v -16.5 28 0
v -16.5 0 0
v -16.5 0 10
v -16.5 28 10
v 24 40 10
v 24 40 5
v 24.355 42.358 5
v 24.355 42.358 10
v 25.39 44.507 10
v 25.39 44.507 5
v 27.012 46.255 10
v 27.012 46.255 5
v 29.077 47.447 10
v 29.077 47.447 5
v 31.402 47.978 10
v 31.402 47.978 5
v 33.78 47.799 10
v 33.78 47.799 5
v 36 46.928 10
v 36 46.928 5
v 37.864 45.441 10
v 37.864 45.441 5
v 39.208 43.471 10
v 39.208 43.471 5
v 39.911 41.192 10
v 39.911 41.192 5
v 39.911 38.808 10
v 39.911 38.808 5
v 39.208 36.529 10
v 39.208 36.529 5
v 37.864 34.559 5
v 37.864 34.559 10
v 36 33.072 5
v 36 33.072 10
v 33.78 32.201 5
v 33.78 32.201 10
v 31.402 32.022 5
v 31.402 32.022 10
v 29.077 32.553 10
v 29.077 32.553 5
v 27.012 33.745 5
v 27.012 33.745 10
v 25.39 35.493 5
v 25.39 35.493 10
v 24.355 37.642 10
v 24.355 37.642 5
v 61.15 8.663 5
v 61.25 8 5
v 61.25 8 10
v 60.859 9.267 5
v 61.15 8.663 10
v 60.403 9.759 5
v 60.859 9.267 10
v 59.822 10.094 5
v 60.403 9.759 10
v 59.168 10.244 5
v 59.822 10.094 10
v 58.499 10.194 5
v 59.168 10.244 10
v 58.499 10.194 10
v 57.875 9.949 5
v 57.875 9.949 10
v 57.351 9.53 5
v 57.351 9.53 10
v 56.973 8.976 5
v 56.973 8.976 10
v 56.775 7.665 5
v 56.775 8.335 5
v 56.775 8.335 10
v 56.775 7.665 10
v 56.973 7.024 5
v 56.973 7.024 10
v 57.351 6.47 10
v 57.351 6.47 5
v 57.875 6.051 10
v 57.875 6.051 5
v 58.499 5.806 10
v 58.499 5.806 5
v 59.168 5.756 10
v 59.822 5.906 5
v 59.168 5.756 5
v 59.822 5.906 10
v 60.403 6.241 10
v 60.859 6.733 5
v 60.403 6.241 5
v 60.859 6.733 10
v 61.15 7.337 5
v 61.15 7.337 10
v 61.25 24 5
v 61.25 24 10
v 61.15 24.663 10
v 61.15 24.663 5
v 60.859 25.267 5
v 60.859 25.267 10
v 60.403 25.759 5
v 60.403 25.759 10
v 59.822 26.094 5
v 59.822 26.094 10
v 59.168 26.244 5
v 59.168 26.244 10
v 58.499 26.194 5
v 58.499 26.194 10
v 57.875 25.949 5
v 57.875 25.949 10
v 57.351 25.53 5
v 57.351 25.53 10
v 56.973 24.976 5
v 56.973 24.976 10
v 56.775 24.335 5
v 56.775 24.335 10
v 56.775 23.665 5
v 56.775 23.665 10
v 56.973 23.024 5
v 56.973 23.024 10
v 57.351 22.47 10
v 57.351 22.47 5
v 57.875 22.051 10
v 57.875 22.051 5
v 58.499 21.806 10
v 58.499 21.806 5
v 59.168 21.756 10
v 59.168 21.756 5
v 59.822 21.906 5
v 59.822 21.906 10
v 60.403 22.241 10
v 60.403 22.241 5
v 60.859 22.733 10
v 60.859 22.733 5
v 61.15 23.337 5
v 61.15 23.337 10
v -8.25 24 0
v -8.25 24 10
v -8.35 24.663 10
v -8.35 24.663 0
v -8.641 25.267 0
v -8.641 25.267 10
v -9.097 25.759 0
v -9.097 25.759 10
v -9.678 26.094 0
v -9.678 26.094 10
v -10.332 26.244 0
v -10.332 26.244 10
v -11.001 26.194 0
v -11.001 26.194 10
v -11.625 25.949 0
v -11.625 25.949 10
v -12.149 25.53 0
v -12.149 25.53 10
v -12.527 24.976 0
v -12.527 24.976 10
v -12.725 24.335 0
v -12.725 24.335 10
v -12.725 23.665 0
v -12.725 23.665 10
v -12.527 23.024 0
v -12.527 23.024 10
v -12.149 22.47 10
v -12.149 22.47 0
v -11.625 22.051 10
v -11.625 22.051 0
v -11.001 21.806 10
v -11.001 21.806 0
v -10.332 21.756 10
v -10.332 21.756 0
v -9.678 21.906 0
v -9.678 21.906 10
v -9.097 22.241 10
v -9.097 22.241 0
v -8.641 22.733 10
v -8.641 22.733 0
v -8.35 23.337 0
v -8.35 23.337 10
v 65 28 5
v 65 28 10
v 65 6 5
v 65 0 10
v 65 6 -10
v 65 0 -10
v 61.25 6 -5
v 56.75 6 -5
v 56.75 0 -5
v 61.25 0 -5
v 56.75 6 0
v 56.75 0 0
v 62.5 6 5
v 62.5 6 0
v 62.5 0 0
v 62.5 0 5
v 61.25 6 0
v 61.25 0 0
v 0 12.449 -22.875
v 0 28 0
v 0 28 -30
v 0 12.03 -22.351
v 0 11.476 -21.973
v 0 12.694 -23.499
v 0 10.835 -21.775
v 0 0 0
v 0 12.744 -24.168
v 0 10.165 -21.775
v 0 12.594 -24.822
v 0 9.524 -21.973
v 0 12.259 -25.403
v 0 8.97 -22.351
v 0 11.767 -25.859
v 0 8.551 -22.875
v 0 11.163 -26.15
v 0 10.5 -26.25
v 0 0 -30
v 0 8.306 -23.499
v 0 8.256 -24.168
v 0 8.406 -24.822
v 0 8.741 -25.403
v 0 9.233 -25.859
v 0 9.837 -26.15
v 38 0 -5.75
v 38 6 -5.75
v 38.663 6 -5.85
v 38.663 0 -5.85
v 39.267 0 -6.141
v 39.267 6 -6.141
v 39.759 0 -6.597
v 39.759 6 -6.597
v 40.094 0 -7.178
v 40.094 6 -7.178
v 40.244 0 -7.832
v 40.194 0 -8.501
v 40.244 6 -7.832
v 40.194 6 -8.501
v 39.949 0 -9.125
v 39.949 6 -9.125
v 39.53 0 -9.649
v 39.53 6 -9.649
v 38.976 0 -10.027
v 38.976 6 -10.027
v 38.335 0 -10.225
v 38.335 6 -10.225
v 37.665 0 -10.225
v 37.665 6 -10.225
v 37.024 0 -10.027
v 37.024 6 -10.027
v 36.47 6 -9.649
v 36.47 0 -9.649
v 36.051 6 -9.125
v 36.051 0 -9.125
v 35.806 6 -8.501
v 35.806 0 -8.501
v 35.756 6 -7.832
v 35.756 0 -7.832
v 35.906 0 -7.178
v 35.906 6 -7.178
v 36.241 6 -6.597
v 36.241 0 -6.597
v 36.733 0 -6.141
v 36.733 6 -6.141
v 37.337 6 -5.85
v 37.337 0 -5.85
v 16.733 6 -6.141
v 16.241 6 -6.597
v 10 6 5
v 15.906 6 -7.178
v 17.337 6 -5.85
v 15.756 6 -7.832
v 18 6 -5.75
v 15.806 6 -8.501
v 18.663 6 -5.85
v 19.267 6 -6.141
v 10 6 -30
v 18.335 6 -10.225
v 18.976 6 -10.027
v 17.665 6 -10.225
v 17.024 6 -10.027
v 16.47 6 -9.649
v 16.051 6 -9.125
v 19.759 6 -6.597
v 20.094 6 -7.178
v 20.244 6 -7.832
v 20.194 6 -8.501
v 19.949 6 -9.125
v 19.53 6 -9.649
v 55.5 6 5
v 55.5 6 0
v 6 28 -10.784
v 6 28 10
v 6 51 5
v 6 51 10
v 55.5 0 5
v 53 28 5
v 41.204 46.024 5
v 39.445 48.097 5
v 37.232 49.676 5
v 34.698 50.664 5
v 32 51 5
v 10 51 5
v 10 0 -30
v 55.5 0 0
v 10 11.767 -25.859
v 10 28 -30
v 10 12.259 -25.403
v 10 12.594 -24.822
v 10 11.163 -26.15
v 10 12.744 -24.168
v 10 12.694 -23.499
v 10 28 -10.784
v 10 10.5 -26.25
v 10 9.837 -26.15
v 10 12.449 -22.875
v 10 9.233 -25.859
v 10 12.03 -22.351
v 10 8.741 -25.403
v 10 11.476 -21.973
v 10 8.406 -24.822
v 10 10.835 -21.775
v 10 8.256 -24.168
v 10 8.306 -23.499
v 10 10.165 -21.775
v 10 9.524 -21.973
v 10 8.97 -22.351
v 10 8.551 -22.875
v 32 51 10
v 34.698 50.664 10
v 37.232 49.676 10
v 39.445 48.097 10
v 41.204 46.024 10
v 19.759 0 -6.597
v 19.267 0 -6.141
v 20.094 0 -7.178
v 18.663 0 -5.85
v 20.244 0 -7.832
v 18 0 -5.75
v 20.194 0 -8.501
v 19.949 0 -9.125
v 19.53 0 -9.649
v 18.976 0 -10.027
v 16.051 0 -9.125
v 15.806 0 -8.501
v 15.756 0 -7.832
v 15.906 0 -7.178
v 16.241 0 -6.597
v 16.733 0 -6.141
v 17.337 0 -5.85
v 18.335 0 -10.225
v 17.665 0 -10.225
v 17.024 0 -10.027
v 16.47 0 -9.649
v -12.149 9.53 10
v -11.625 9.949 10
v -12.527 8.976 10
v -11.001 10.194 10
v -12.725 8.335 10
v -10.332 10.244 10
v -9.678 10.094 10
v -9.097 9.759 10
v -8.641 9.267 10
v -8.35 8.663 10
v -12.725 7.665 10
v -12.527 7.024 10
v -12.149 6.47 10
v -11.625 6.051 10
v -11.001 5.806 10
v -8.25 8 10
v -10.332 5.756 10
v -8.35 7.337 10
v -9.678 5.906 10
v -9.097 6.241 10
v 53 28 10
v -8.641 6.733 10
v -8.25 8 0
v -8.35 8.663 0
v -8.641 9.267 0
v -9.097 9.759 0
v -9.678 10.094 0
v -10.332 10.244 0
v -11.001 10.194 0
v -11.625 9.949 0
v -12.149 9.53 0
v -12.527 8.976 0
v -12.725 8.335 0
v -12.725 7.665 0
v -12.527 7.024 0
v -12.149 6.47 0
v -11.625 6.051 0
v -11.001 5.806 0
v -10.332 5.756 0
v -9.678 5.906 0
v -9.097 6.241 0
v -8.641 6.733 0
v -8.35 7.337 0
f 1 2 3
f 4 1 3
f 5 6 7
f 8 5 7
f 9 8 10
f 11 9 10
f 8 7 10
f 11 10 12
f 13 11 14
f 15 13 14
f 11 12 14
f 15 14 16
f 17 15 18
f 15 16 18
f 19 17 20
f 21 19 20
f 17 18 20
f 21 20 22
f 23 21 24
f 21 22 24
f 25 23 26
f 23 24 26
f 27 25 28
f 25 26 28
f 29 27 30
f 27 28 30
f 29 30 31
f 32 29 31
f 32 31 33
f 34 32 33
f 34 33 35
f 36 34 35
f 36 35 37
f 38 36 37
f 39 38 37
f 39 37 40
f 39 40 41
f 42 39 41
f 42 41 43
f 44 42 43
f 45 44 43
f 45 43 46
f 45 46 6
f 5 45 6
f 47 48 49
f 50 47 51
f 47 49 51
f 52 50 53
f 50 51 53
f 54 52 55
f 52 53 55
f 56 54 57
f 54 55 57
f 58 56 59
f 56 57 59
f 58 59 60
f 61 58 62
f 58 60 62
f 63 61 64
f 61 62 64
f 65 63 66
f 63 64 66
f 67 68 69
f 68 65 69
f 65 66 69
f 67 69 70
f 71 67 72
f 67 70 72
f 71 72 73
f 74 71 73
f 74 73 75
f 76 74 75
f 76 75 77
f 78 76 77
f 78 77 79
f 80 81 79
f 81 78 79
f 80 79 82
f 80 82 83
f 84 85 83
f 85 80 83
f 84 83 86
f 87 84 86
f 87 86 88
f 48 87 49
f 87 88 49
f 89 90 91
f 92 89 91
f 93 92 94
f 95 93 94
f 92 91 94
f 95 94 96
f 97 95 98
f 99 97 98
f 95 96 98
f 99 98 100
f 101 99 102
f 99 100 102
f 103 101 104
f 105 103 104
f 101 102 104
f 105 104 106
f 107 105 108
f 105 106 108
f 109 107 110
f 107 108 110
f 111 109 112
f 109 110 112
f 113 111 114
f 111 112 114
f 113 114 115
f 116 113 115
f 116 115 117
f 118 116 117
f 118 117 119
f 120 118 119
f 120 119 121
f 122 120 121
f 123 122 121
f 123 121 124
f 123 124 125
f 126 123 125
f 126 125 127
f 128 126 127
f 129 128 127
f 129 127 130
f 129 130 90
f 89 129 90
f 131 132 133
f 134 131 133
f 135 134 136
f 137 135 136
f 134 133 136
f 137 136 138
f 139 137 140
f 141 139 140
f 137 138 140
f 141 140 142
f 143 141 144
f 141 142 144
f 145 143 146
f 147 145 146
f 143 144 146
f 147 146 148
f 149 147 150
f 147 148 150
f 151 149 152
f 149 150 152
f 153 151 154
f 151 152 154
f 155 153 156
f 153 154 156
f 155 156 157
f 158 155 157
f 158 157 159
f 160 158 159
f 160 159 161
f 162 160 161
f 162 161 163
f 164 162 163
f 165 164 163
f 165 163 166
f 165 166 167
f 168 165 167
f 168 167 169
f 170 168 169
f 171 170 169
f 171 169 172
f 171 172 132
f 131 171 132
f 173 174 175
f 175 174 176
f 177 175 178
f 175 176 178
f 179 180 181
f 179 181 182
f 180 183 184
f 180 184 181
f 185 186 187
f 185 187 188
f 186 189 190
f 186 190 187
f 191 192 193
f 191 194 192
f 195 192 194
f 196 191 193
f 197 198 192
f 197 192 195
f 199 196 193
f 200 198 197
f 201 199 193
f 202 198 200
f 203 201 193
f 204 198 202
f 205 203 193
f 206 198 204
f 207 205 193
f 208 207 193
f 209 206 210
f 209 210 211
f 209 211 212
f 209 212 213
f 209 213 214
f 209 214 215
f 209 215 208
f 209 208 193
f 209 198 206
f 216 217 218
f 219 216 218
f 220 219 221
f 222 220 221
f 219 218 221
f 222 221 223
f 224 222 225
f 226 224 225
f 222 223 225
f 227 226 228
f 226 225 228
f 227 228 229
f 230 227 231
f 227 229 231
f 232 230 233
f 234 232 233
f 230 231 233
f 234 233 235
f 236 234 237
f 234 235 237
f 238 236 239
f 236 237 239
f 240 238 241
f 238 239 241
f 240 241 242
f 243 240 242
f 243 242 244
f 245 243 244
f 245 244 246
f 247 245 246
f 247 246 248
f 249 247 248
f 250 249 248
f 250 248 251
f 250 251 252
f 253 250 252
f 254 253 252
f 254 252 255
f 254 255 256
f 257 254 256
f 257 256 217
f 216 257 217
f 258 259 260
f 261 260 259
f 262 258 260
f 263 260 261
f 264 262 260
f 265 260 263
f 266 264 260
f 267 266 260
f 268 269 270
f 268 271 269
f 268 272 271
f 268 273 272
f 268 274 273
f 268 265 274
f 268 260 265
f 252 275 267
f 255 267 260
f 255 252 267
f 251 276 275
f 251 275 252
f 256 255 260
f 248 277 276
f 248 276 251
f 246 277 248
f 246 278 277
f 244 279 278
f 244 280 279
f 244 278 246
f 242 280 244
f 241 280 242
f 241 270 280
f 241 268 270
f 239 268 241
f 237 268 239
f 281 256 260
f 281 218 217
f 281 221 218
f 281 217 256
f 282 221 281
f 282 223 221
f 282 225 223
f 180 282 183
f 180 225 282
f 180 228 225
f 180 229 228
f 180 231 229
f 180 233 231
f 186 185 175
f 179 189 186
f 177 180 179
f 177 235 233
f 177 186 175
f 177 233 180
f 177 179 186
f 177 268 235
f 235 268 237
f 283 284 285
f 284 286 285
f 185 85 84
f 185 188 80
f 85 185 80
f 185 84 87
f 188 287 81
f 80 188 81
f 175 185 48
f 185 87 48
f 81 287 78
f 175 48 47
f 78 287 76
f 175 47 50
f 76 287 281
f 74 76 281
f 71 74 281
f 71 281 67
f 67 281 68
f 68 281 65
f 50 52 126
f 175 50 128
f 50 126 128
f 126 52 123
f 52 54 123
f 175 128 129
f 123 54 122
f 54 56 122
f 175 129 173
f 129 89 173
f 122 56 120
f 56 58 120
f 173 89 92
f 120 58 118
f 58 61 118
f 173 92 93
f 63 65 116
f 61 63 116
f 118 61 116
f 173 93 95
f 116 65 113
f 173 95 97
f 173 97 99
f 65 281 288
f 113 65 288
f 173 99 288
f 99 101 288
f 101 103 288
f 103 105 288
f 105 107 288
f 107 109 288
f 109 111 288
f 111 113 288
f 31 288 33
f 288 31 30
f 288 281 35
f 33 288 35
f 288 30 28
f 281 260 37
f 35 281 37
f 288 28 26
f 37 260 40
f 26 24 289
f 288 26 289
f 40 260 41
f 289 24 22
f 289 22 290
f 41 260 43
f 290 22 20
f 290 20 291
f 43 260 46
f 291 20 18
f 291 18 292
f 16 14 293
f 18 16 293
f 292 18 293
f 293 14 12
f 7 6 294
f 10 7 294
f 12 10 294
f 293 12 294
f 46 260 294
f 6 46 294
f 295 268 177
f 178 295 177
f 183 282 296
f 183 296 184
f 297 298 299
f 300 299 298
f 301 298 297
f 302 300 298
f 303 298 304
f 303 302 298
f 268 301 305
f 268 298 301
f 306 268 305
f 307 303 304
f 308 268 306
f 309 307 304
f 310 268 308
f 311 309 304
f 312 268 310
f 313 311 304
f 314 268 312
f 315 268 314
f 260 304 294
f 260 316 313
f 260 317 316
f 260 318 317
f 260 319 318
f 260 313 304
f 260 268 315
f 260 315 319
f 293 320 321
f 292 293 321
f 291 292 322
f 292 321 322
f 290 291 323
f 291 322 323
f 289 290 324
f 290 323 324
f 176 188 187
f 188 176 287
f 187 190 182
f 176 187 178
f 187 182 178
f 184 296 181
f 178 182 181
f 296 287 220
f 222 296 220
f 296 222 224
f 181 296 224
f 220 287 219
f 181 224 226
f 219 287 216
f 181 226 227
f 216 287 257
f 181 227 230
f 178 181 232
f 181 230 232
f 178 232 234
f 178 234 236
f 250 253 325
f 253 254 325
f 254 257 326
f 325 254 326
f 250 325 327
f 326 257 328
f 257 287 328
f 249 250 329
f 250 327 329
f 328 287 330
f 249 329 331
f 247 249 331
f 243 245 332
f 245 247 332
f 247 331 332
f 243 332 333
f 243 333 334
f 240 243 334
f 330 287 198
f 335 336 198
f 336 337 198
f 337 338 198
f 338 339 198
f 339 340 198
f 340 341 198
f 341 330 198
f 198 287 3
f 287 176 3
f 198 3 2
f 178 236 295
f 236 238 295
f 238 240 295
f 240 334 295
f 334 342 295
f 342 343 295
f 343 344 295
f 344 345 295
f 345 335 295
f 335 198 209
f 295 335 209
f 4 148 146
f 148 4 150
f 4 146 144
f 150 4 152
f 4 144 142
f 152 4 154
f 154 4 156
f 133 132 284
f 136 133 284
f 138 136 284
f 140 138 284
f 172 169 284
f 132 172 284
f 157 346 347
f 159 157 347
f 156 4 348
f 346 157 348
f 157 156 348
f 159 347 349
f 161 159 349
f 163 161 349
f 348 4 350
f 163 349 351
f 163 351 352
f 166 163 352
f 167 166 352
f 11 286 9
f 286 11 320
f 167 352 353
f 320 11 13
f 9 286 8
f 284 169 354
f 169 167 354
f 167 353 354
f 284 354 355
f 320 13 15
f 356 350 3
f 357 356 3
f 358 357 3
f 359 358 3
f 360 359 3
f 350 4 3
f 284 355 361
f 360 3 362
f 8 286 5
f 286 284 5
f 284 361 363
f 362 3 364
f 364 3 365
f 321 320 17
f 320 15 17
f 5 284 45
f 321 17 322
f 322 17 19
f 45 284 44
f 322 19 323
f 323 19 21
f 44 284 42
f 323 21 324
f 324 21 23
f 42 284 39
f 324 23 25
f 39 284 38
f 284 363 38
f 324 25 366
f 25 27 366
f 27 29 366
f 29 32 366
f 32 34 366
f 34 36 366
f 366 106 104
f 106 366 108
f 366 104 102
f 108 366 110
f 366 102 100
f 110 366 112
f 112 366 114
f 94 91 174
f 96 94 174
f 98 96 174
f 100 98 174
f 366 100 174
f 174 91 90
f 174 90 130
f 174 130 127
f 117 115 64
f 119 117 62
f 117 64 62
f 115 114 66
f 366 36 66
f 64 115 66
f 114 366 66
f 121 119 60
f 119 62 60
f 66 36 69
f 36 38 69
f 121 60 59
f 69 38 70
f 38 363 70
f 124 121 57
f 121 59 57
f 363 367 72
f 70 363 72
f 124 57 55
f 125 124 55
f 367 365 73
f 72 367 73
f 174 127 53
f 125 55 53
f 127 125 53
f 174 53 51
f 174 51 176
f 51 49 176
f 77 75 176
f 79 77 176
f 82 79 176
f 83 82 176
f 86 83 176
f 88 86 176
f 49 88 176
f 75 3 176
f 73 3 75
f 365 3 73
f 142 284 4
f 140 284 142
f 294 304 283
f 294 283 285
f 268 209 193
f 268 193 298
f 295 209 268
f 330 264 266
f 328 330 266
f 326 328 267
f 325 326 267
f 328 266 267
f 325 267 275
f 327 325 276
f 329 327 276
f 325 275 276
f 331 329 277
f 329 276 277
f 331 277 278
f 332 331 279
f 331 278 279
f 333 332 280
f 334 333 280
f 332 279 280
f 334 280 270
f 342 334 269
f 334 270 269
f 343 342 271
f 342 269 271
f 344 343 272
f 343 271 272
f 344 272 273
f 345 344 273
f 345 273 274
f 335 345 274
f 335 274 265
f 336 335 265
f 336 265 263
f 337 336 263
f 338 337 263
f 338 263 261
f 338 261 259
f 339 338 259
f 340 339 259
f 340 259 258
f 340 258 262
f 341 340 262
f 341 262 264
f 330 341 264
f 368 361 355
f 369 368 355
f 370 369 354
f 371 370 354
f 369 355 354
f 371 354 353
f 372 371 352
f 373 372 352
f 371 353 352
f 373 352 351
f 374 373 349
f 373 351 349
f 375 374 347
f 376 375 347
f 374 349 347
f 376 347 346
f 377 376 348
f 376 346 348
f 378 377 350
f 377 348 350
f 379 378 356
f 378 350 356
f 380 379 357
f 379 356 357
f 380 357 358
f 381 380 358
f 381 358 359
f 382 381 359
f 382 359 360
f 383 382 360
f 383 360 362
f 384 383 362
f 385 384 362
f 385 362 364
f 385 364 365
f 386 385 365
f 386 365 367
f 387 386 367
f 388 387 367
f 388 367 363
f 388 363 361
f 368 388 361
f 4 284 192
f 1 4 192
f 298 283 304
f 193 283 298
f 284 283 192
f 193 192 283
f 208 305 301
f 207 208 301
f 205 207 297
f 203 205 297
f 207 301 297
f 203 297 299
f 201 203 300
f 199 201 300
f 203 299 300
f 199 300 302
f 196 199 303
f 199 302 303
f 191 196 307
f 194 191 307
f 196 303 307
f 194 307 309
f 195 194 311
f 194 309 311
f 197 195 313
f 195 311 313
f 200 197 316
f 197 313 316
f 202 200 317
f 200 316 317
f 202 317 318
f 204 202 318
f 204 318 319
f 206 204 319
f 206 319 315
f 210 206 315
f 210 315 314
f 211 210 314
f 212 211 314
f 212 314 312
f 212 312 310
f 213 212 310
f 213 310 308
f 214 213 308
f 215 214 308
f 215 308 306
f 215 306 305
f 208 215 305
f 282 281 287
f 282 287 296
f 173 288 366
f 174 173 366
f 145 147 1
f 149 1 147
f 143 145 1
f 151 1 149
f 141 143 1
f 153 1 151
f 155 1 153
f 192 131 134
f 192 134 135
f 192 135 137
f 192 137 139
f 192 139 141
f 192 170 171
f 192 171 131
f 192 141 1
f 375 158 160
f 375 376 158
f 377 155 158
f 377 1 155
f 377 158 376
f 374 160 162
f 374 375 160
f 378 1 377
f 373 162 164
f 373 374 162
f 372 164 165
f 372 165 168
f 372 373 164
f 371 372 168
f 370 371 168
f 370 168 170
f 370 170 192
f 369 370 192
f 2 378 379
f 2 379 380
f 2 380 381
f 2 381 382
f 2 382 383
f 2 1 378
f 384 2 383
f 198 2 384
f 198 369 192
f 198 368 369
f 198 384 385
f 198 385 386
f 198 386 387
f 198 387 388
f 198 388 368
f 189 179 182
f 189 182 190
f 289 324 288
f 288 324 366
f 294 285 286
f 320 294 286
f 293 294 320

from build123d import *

# Parameters (mm, degrees)
BOSS_EXTRUDE1_DEPTH = 28
SKETCH3_W           = 43
SKETCH3_H           = 5
BOSS_EXTRUDE2_DEPTH = 51
SKETCH4_R           = 8
CUT_EXTRUDE1_DEPTH  = 82.455509329
BOSS_EXTRUDE3_DEPTH = 12
BOSS_EXTRUDE4_DEPTH = 12
SKETCH5_R           = 2.25
CUT_EXTRUDE2_DEPTH  = 96.551033485
SKETCH8_W           = 55
SKETCH8_H           = 35
BOSS_EXTRUDE5_DEPTH = 6
CUT_EXTRUDE3_DEPTH  = 85.557672626
BOSS_EXTRUDE6_DEPTH = 4
SKETCH11_R          = 2.25
CUT_EXTRUDE4_DEPTH  = 81.783661714
CUT_EXTRUDE5_REACH  = 86.558
SKETCH12_R          = 2.25
CUT_EXTRUDE6_DEPTH  = 85.557672626
CUT_EXTRUDE7_DEPTH  = 92.793245939
SKETCH15_W          = 8
SKETCH15_H          = 28
CUT_EXTRUDE8_DEPTH  = 101.713703139


with BuildPart() as part:
    # Sketch2 → Boss-Extrude1 (new body)
    with BuildSketch(Plane(origin=(0, 0, 0), x_dir=(1, 0, 0), z_dir=(0, 1, 0))):
        Polygon((-16.5, 0), (0, 0), (0, 30), (10, 30), (10, -10), (-16.5, -10), align=None)
    extrude(amount=BOSS_EXTRUDE1_DEPTH)

    # Sketch3 → Boss-Extrude2 (add)
    with BuildSketch(Plane(origin=(0, 0, 0), x_dir=(1, 0, 0), z_dir=(0, 1, 0))):
        with Locations((31.5, -7.5)):
            Rectangle(SKETCH3_W, SKETCH3_H)
    extrude(amount=BOSS_EXTRUDE2_DEPTH)

    # Sketch4 → Cut-Extrude1 (cut, through all)
    with BuildSketch(Plane(origin=(0, 0, 5), x_dir=(-1, 0, 0), z_dir=(0, 0, -1))):
        with Locations((-32, 40)):
            Circle(SKETCH4_R)
    extrude(amount=-CUT_EXTRUDE1_DEPTH, mode=Mode.SUBTRACT)

    # Sketch6 → Boss-Extrude3 (add)
    with BuildSketch(Plane.ZY.offset(16.5)):
        with BuildLine():
            Line((10, 28), (10, 0))
            Line((10, 0), (18, 0))
            Line((18, 0), (18, 12))
            ThreePointArc((18, 12), (14, 16), (18, 20))
            Line((18, 20), (18, 28))
            Line((18, 28), (10, 28))
        make_face()
    extrude(amount=-BOSS_EXTRUDE3_DEPTH)

    # Sketch7 → Boss-Extrude4 (add)
    with BuildSketch(Plane(origin=(53, 0, 0), x_dir=(0, 0, -1), z_dir=(1, 0, 0))):
        with BuildLine():
            Line((-18, 12), (-18, 0))
            Line((-18, 0), (-5, 0))
            Line((-5, 0), (-5, 28))
            Line((-5, 28), (-18, 28))
            Line((-18, 28), (-18, 20))
            ThreePointArc((-18, 20), (-14, 16), (-18, 12))
        make_face()
    extrude(amount=BOSS_EXTRUDE4_DEPTH)

    # Sketch5 → Cut-Extrude2 (cut, through all)
    with BuildSketch(Plane.XY.offset(18)):
        with Locations((-10.5, 24)):
            Circle(SKETCH5_R)
        with Locations((-10.5, 8)):
            Circle(SKETCH5_R)
        with Locations((59, 8)):
            Circle(SKETCH5_R)
        with Locations((59, 24)):
            Circle(SKETCH5_R)
    extrude(amount=-CUT_EXTRUDE2_DEPTH, mode=Mode.SUBTRACT)

    # Sketch8 → Boss-Extrude5 (add)
    with BuildSketch(Plane(origin=(0, 0, 0), x_dir=(1, 0, 0), z_dir=(0, 1, 0))):
        with Locations((37.5, 12.5)):
            Rectangle(SKETCH8_W, SKETCH8_H)
    extrude(amount=BOSS_EXTRUDE5_DEPTH)

    # Sketch9 → Cut-Extrude3 (cut, through all)
    with BuildSketch(Plane(origin=(0, 6, 0), x_dir=(-1, 0, 0), z_dir=(0, 1, 0))):
        Polygon((-62.5, 5), (-55.5, 5), (-55.5, 0), (-56.75, 0), (-56.75, -5), (-61.25, -5), (-61.25, 0), (-62.5, 0), align=None)
    extrude(amount=-CUT_EXTRUDE3_DEPTH, mode=Mode.SUBTRACT)

    # Sketch10 → Boss-Extrude6 (add)
    with BuildSketch(Plane.ZY.offset(-10)):
        Polygon((-30, 0), (5, 51), (10, 51), (10, 36.428571429), (10, 0), (-15, 0), align=None)
    extrude(amount=BOSS_EXTRUDE6_DEPTH)

    # Sketch11 → Cut-Extrude4 (cut, through all)
    with BuildSketch(Plane(origin=(10, 0, 0), x_dir=(0, 0, -1), z_dir=(1, 0, 0))):
        with Locations((24, 10.5)):
            Circle(SKETCH11_R)
    extrude(amount=-CUT_EXTRUDE4_DEPTH, mode=Mode.SUBTRACT)

    # Sketch12 → Cut-Extrude5 (cut, up to next)
    with BuildSketch(Plane(origin=(0, 6, 0), x_dir=(-1, 0, 0), z_dir=(0, 1, 0)), mode=Mode.PRIVATE) as cut_extrude5_sk1:
        with Locations(Location((-18, -8, 0), (0, 0, 90))):
            Circle(SKETCH12_R)
    cut_extrude5_tool1 = extrude(cut_extrude5_sk1.sketch, amount=-CUT_EXTRUDE5_REACH, mode=Mode.PRIVATE) & part.part
    # Sketch12 → Cut-Extrude5 (cut, up to next)
    with BuildSketch(Plane(origin=(0, 6, 0), x_dir=(-1, 0, 0), z_dir=(0, 1, 0)), mode=Mode.PRIVATE) as cut_extrude5_sk2:
        with Locations(Location((-38, -8, 0), (0, 0, 90))):
            Circle(SKETCH12_R)
    cut_extrude5_tool2 = extrude(cut_extrude5_sk2.sketch, amount=-CUT_EXTRUDE5_REACH, mode=Mode.PRIVATE) & part.part
    add(cut_extrude5_tool1.solids().sort_by_distance((18, 6, -8))[0], mode=Mode.SUBTRACT)
    add(cut_extrude5_tool2.solids().sort_by_distance((38, 6, -8))[0], mode=Mode.SUBTRACT)

    # Sketch13 → Cut-Extrude6 (cut, through all)
    with BuildSketch(Plane(origin=(0, 6, 0), x_dir=(-1, 0, 0), z_dir=(0, 1, 0))):
        Polygon((-10, -30), (-65, -10), (-65, -30), align=None)
    extrude(amount=-CUT_EXTRUDE6_DEPTH, mode=Mode.SUBTRACT)

    # Sketch14 → Cut-Extrude7 (cut, through all)
    with BuildSketch(Plane.XY.offset(10)):
        with BuildLine():
            Line((41.204046185, 46.02374749), (53, 28))
            Line((53, 28), (53, 51))
            Line((53, 51), (32, 51))
            ThreePointArc((32, 51), (37.23157613, 49.67629119), (41.204046185, 46.02374749))
        make_face()
    extrude(amount=-CUT_EXTRUDE7_DEPTH, mode=Mode.SUBTRACT)

    # Sketch15 → Cut-Extrude8 (cut, through all)
    with BuildSketch(Plane.ZY.offset(16.5)):
        with Locations((14, 14)):
            Rectangle(SKETCH15_W, SKETCH15_H)
    extrude(amount=-CUT_EXTRUDE8_DEPTH, mode=Mode.SUBTRACT)


solid = part.part
